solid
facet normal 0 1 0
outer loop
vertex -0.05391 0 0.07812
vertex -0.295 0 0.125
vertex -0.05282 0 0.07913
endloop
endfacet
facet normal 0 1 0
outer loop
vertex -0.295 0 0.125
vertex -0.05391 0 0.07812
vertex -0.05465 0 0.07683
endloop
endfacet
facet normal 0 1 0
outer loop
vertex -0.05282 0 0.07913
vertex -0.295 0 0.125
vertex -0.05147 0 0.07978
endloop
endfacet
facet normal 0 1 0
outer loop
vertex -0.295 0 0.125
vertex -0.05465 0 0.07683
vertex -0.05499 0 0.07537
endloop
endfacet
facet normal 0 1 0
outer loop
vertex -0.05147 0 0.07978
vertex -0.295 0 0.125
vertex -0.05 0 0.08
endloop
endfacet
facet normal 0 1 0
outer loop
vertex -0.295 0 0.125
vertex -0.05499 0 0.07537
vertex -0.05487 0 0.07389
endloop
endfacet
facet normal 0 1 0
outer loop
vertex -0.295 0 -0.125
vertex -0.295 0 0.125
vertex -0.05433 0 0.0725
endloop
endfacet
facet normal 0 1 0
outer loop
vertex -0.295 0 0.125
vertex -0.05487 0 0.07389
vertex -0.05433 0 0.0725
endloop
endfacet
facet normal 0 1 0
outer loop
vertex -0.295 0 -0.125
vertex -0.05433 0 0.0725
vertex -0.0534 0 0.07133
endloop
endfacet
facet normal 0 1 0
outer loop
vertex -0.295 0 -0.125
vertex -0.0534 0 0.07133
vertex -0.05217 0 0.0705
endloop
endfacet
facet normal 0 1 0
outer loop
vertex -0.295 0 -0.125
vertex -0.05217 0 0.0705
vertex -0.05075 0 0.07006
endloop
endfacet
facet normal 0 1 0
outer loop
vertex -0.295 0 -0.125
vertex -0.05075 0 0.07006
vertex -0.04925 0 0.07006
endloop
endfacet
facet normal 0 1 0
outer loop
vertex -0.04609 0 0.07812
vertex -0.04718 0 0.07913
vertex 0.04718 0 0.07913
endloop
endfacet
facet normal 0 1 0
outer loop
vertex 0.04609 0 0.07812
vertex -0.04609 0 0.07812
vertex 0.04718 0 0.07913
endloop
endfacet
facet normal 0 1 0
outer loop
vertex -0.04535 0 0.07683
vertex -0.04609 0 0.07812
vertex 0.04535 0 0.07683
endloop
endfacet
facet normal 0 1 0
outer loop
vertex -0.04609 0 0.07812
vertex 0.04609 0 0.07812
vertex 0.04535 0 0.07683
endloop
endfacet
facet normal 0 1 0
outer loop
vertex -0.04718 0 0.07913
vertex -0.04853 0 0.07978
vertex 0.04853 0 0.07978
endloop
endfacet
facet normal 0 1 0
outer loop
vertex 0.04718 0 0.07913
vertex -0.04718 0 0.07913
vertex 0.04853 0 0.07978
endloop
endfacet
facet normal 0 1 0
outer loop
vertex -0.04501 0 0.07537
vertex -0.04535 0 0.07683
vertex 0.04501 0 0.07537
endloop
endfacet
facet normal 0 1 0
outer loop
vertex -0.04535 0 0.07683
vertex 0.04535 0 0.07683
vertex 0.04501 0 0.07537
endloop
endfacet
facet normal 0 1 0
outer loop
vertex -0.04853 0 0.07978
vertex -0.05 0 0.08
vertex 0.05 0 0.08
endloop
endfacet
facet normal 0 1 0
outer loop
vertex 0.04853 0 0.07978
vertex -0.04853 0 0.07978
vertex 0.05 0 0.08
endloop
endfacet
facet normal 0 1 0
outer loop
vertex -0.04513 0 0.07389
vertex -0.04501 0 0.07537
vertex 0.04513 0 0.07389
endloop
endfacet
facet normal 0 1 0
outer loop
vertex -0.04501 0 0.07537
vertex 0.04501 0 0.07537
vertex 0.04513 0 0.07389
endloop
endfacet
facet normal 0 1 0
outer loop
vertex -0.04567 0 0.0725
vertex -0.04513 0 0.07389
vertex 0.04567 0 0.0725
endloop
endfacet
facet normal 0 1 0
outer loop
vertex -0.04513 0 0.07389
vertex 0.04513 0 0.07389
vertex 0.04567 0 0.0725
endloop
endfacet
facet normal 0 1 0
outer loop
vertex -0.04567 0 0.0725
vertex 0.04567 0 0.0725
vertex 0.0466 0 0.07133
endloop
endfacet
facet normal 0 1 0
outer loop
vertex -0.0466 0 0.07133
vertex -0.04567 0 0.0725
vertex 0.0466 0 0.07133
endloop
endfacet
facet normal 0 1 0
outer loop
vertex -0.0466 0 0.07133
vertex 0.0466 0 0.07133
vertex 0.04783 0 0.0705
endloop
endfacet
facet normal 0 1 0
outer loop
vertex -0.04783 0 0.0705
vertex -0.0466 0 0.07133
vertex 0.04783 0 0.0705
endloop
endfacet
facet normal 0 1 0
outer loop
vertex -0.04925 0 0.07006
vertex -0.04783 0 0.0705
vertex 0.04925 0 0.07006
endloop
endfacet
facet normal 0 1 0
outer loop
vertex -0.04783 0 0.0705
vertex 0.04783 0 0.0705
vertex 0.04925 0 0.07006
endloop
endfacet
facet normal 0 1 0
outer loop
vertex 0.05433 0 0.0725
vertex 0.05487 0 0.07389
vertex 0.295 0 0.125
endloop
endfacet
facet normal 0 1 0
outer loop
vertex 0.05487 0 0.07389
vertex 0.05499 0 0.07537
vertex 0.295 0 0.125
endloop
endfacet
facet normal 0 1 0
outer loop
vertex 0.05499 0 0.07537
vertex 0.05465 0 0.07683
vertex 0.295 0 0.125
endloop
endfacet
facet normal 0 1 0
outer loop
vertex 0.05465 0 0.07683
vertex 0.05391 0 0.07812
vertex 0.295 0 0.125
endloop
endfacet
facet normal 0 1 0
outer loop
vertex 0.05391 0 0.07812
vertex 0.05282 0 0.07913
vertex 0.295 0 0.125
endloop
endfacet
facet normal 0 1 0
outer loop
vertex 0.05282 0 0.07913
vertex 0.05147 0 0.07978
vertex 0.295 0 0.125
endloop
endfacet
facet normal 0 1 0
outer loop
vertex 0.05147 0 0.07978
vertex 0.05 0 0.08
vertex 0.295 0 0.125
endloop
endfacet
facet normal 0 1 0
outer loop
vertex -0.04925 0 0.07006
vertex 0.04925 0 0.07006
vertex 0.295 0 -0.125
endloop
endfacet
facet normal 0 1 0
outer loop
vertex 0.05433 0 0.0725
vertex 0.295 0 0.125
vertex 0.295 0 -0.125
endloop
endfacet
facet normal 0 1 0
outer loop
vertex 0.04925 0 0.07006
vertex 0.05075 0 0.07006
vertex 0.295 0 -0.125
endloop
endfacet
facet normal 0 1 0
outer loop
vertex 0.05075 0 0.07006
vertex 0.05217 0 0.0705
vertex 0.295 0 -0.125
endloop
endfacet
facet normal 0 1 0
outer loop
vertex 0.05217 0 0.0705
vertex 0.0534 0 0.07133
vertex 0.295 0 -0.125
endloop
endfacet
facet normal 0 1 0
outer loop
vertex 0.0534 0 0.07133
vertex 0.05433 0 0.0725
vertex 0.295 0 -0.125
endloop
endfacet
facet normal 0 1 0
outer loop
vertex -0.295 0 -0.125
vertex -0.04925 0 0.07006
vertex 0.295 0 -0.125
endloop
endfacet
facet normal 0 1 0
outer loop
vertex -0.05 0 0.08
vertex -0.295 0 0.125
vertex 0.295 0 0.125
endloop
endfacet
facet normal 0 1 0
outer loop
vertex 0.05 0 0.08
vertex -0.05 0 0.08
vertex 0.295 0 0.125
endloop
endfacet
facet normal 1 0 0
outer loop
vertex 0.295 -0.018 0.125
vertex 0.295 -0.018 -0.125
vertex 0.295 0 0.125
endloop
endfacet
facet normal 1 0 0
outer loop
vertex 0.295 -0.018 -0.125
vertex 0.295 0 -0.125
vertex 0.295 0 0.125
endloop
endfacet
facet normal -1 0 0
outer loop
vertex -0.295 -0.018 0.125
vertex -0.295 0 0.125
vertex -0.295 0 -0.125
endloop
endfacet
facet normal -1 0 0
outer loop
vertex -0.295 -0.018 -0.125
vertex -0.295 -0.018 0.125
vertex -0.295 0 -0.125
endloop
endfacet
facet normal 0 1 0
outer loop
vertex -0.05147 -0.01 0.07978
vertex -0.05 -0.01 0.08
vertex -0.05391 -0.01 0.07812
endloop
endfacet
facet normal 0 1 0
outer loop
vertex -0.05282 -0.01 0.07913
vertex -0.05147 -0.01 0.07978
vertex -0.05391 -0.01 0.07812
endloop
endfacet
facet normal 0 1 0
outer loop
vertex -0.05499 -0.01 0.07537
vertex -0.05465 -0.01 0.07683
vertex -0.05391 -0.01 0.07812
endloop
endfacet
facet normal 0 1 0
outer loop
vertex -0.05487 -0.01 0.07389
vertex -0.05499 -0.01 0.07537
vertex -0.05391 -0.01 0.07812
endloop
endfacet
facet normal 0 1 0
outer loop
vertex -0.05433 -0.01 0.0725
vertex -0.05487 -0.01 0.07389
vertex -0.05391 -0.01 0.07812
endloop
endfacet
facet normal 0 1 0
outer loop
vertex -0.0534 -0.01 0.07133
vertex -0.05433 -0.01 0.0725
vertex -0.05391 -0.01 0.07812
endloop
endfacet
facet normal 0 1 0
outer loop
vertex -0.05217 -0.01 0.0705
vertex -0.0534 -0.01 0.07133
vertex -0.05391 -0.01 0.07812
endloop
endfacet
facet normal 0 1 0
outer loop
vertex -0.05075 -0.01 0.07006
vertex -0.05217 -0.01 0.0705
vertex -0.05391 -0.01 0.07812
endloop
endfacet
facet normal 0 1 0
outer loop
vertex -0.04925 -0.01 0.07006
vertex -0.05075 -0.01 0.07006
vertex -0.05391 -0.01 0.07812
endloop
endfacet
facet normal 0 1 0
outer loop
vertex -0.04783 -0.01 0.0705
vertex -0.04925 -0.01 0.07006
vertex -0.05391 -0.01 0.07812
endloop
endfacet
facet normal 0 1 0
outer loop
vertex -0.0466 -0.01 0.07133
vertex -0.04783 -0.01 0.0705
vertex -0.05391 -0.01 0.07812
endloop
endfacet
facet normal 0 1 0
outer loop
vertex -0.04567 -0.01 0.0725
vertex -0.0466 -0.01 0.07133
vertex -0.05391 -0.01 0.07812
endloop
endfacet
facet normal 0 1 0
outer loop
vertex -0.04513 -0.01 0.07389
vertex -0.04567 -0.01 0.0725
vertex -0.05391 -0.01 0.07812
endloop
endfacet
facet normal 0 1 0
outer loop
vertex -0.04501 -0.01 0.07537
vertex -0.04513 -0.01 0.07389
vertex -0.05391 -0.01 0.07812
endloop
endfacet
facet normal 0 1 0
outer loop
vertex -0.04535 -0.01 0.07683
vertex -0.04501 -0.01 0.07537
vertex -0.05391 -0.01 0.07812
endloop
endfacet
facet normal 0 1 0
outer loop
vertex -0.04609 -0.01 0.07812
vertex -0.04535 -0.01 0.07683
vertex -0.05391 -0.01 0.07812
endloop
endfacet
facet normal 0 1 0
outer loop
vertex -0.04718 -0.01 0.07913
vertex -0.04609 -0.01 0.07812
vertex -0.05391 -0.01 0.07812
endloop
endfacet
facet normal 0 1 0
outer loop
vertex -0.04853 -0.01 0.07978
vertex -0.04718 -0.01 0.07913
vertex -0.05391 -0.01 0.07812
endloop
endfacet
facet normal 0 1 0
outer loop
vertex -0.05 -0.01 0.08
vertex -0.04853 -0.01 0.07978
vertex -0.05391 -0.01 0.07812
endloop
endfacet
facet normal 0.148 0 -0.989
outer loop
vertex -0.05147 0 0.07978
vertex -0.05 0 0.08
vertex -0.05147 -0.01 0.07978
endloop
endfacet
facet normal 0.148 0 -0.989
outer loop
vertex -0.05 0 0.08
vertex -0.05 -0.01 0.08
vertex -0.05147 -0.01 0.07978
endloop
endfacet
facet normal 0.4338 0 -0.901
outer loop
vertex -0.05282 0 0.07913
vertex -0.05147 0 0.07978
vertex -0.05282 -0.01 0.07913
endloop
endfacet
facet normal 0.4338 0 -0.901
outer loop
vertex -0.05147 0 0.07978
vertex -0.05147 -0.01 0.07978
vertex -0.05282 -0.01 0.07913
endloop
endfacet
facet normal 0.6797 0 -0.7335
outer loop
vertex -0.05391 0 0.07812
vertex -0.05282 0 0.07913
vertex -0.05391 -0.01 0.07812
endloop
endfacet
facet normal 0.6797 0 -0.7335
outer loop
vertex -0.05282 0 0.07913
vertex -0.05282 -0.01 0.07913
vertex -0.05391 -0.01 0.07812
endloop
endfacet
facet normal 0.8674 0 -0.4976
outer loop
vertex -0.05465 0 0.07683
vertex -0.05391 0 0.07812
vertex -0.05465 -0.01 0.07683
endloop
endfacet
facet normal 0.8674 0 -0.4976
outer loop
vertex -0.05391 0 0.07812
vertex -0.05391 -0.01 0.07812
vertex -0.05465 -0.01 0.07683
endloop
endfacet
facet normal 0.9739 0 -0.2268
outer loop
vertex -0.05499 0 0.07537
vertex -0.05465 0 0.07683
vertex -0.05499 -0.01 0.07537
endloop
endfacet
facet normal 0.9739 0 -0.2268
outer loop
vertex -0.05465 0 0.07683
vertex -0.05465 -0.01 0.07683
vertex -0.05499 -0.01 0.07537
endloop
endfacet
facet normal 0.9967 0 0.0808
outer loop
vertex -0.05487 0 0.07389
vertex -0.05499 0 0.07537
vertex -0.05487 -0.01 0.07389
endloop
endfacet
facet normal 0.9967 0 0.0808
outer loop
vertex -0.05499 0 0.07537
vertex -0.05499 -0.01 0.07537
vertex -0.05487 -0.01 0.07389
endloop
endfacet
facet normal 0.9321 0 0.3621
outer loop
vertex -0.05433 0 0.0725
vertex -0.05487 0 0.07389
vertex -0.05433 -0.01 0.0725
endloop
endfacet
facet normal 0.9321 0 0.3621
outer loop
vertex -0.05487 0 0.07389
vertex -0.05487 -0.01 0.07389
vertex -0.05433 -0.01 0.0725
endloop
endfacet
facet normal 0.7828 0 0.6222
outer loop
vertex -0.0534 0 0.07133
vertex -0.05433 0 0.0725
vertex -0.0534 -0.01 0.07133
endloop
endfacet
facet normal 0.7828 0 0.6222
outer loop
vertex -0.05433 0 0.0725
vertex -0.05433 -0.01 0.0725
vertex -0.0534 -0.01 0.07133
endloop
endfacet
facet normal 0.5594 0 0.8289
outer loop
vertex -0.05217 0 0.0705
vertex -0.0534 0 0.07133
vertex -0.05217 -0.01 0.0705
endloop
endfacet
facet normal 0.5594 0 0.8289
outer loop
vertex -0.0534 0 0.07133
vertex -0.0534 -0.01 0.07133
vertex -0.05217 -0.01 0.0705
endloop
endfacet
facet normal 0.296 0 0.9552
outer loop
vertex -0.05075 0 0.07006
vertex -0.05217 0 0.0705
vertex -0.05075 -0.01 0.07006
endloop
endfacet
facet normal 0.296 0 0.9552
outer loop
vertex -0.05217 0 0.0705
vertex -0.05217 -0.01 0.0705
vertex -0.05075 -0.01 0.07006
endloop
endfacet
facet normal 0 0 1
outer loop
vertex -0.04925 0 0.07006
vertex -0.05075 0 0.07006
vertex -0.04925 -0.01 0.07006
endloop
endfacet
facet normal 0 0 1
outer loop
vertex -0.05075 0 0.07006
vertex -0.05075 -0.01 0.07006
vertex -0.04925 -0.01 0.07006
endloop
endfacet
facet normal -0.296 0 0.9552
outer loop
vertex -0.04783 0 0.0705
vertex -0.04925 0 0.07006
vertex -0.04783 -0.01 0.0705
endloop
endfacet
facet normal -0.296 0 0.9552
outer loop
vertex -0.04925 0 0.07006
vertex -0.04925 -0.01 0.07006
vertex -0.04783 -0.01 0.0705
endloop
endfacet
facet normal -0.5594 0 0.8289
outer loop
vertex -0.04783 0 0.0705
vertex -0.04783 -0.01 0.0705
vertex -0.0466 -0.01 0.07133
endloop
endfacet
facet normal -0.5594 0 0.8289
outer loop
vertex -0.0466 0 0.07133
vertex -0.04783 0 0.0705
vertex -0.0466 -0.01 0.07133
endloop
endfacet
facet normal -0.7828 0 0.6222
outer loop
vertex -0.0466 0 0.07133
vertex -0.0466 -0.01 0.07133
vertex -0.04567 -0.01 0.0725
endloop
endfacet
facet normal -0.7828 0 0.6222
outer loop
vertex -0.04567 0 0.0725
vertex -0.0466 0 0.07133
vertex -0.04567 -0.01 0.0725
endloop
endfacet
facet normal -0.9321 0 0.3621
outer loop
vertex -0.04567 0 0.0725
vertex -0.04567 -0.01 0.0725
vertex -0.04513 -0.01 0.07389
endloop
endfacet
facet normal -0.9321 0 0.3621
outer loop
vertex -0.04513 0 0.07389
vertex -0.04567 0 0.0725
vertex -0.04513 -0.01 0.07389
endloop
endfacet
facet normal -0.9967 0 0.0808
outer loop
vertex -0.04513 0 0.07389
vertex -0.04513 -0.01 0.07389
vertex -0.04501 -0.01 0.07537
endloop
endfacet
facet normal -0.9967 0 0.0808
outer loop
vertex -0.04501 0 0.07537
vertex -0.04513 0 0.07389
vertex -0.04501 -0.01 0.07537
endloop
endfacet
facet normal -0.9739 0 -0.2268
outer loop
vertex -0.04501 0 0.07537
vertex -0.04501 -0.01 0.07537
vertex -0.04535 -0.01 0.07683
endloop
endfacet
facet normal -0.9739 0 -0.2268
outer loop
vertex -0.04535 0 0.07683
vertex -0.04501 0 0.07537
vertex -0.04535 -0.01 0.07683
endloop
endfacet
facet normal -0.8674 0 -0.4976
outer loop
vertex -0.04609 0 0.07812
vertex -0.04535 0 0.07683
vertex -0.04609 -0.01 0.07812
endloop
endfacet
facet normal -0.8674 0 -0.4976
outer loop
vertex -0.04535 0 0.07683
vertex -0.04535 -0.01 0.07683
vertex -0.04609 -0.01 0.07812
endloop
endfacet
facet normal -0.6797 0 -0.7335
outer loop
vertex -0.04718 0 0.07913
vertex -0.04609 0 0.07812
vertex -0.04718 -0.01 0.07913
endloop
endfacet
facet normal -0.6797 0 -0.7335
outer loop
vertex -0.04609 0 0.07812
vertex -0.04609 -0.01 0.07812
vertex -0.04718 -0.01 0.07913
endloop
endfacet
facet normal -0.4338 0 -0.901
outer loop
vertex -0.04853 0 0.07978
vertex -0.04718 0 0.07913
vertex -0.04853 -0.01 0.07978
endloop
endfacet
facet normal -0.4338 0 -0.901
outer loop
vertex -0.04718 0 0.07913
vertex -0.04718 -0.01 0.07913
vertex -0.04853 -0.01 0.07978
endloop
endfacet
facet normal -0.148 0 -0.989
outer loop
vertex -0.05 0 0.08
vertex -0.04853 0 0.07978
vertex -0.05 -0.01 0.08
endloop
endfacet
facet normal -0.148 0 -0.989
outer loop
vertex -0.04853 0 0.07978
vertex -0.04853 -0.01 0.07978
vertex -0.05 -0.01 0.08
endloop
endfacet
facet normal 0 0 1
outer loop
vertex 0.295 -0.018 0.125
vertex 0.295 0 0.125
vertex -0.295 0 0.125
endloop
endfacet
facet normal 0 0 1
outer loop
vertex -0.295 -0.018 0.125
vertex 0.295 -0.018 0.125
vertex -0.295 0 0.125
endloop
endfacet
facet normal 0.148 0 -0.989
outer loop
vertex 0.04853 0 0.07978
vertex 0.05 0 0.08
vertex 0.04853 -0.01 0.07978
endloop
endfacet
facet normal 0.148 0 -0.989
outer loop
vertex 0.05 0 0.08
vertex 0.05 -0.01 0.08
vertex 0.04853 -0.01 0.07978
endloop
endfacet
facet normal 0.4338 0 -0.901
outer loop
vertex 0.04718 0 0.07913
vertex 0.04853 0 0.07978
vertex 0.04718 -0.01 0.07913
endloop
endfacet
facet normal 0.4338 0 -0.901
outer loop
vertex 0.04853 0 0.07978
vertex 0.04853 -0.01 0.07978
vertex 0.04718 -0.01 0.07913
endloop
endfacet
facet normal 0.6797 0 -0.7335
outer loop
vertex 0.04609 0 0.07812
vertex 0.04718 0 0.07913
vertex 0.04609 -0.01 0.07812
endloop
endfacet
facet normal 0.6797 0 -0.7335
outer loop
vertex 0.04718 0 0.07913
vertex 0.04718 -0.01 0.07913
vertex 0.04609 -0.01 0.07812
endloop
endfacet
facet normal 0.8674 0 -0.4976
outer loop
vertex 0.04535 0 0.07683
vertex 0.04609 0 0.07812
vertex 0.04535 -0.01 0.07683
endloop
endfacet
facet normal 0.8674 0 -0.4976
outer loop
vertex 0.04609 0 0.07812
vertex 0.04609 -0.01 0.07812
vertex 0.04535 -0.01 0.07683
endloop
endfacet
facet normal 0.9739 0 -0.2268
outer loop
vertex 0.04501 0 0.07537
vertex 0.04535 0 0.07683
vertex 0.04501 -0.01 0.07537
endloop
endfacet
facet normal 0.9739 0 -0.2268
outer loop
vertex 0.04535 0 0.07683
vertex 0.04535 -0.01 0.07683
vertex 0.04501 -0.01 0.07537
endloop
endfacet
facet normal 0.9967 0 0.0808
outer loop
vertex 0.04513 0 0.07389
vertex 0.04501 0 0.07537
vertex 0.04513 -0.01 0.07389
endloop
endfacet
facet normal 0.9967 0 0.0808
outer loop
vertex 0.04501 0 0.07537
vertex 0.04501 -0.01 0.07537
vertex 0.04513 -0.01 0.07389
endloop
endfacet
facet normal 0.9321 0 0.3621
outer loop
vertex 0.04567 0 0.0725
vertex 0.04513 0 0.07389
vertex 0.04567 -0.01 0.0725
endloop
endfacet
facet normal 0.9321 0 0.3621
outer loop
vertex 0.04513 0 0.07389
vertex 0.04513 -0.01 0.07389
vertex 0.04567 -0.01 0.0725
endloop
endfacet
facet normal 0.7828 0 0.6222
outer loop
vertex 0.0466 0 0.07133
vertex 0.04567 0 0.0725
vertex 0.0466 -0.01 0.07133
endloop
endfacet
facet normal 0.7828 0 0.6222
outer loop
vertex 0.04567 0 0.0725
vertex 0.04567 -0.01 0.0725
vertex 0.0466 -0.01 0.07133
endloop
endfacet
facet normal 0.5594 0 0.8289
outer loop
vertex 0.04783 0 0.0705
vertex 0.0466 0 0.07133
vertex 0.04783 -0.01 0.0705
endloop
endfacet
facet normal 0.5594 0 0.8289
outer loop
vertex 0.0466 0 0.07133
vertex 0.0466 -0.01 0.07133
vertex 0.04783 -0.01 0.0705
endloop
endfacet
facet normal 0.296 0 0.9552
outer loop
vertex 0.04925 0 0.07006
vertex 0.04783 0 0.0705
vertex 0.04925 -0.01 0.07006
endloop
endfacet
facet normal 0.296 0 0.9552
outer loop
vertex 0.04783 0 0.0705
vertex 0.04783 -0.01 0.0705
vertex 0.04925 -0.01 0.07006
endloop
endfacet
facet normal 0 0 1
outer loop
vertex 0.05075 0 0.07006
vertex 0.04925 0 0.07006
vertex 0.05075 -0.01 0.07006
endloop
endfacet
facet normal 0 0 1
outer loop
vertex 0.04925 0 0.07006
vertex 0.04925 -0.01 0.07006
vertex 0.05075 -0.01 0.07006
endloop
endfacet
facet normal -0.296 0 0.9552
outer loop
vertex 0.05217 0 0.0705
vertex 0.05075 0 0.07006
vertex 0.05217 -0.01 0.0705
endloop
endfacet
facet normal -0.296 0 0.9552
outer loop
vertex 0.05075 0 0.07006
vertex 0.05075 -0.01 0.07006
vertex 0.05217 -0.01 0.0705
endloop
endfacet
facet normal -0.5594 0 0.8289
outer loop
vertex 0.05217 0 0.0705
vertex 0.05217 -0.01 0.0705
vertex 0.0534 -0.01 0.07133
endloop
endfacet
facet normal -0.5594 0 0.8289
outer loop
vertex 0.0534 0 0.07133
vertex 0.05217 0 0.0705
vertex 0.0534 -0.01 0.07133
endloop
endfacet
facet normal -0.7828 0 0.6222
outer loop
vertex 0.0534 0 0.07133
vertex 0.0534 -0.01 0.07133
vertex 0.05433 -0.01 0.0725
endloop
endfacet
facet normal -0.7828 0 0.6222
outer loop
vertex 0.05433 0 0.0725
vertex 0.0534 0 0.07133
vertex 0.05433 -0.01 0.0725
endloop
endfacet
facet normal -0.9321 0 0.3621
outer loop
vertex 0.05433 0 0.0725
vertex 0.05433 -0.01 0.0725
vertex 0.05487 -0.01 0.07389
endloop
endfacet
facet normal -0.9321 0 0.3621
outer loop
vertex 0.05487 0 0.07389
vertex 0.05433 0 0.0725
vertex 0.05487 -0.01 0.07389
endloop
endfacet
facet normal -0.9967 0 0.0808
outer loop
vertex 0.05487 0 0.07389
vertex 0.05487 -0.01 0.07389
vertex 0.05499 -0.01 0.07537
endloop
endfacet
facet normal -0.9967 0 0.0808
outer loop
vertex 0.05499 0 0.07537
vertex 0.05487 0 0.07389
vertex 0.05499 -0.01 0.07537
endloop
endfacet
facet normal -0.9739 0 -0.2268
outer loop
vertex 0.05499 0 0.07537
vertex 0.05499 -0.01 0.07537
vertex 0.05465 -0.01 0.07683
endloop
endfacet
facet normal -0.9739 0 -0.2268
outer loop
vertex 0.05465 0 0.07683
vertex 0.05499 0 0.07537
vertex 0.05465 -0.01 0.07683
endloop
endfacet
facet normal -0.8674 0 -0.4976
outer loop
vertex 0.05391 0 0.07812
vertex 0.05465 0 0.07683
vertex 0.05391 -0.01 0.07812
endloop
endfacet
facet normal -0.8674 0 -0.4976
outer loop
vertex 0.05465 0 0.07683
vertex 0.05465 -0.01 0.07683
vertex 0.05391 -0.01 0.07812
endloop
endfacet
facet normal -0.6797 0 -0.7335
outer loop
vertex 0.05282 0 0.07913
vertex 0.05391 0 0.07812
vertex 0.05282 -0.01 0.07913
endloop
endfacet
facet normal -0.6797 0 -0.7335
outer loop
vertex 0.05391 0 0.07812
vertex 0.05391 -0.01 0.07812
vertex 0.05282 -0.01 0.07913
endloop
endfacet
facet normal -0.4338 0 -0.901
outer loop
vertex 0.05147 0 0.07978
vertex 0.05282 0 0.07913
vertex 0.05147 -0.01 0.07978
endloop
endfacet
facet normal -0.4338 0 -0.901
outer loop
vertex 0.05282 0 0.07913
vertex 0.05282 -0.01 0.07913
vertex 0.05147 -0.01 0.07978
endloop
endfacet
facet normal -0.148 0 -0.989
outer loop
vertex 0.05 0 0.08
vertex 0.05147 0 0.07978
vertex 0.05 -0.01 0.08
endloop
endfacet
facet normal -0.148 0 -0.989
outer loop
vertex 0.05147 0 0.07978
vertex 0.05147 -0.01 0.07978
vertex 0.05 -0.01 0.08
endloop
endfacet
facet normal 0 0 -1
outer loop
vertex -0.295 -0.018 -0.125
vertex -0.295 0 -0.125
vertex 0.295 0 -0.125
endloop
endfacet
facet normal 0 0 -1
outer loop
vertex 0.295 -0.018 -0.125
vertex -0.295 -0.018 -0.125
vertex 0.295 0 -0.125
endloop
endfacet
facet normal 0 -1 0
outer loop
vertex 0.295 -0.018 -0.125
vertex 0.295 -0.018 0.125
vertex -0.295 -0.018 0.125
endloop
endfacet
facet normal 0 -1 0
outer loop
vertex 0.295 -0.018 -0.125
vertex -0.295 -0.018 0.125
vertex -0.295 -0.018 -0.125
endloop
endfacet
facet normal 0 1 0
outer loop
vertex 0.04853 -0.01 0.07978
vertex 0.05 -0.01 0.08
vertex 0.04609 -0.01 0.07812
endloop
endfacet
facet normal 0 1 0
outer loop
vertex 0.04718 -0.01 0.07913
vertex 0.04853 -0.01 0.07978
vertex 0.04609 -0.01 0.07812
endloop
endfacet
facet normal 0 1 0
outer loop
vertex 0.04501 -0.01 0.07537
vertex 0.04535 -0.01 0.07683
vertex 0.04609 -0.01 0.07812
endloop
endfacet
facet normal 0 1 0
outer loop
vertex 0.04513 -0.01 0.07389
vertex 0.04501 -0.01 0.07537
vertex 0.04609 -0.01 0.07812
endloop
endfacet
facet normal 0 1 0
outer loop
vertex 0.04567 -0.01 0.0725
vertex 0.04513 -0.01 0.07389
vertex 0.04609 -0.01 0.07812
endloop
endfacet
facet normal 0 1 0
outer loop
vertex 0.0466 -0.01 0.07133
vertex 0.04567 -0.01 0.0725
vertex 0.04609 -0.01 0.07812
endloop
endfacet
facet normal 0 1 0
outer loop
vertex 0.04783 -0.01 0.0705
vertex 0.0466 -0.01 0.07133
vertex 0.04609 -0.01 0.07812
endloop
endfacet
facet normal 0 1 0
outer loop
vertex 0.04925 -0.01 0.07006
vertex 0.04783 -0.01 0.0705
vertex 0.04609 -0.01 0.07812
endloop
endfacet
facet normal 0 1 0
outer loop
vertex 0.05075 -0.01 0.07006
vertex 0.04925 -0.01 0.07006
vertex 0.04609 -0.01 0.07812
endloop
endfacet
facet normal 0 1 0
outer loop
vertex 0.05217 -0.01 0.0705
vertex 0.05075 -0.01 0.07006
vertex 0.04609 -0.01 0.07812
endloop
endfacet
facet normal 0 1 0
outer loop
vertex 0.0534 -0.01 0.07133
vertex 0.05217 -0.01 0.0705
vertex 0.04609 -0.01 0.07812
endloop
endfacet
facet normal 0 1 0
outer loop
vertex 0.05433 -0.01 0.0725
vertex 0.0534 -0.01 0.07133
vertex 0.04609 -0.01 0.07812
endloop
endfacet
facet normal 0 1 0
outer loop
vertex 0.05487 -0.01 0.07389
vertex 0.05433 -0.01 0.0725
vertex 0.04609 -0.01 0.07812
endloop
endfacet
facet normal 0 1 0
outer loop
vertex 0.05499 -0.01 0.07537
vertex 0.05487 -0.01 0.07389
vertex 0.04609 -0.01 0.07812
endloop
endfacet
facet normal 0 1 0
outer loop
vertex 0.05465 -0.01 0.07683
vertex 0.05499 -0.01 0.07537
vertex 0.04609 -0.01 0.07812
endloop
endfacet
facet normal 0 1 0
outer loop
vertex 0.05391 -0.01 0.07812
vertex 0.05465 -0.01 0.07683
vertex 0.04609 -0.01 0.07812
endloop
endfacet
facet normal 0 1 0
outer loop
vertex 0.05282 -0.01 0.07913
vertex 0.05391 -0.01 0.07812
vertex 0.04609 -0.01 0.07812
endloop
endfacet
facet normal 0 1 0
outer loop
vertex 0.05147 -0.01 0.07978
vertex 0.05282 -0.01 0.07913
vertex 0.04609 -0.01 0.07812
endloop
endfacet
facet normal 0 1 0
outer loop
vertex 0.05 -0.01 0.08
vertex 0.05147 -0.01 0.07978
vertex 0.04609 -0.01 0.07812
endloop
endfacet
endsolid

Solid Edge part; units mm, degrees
sketch "Sketch1" plane through (0, 0, 0) normal (0, -1, 0) x (1, 0, 0)
  line L0 (-0.295, -0.125) -> (0.295, -0.125)
  line L1 (0.295, -0.125) -> (0.295, 0.125)
  line L2 (0.295, 0.125) -> (-0.295, 0.125)
  line L3 (-0.295, 0.125) -> (-0.295, -0.125)
  dimension "D1" = 0.25
  dimension "D2" = 0.59
extrude "Protrusion1" add sketch "Sketch1" along normal blind 0.018
hole "Bohrung_1" at (-0.05, 0, 0.075) direction (0, -1, 0) diameter 0.01 depth 0.01
hole "Hole1" at (0.05, 0, 0.075) direction (0, -1, 0) diameter 0.01 depth 0.01
